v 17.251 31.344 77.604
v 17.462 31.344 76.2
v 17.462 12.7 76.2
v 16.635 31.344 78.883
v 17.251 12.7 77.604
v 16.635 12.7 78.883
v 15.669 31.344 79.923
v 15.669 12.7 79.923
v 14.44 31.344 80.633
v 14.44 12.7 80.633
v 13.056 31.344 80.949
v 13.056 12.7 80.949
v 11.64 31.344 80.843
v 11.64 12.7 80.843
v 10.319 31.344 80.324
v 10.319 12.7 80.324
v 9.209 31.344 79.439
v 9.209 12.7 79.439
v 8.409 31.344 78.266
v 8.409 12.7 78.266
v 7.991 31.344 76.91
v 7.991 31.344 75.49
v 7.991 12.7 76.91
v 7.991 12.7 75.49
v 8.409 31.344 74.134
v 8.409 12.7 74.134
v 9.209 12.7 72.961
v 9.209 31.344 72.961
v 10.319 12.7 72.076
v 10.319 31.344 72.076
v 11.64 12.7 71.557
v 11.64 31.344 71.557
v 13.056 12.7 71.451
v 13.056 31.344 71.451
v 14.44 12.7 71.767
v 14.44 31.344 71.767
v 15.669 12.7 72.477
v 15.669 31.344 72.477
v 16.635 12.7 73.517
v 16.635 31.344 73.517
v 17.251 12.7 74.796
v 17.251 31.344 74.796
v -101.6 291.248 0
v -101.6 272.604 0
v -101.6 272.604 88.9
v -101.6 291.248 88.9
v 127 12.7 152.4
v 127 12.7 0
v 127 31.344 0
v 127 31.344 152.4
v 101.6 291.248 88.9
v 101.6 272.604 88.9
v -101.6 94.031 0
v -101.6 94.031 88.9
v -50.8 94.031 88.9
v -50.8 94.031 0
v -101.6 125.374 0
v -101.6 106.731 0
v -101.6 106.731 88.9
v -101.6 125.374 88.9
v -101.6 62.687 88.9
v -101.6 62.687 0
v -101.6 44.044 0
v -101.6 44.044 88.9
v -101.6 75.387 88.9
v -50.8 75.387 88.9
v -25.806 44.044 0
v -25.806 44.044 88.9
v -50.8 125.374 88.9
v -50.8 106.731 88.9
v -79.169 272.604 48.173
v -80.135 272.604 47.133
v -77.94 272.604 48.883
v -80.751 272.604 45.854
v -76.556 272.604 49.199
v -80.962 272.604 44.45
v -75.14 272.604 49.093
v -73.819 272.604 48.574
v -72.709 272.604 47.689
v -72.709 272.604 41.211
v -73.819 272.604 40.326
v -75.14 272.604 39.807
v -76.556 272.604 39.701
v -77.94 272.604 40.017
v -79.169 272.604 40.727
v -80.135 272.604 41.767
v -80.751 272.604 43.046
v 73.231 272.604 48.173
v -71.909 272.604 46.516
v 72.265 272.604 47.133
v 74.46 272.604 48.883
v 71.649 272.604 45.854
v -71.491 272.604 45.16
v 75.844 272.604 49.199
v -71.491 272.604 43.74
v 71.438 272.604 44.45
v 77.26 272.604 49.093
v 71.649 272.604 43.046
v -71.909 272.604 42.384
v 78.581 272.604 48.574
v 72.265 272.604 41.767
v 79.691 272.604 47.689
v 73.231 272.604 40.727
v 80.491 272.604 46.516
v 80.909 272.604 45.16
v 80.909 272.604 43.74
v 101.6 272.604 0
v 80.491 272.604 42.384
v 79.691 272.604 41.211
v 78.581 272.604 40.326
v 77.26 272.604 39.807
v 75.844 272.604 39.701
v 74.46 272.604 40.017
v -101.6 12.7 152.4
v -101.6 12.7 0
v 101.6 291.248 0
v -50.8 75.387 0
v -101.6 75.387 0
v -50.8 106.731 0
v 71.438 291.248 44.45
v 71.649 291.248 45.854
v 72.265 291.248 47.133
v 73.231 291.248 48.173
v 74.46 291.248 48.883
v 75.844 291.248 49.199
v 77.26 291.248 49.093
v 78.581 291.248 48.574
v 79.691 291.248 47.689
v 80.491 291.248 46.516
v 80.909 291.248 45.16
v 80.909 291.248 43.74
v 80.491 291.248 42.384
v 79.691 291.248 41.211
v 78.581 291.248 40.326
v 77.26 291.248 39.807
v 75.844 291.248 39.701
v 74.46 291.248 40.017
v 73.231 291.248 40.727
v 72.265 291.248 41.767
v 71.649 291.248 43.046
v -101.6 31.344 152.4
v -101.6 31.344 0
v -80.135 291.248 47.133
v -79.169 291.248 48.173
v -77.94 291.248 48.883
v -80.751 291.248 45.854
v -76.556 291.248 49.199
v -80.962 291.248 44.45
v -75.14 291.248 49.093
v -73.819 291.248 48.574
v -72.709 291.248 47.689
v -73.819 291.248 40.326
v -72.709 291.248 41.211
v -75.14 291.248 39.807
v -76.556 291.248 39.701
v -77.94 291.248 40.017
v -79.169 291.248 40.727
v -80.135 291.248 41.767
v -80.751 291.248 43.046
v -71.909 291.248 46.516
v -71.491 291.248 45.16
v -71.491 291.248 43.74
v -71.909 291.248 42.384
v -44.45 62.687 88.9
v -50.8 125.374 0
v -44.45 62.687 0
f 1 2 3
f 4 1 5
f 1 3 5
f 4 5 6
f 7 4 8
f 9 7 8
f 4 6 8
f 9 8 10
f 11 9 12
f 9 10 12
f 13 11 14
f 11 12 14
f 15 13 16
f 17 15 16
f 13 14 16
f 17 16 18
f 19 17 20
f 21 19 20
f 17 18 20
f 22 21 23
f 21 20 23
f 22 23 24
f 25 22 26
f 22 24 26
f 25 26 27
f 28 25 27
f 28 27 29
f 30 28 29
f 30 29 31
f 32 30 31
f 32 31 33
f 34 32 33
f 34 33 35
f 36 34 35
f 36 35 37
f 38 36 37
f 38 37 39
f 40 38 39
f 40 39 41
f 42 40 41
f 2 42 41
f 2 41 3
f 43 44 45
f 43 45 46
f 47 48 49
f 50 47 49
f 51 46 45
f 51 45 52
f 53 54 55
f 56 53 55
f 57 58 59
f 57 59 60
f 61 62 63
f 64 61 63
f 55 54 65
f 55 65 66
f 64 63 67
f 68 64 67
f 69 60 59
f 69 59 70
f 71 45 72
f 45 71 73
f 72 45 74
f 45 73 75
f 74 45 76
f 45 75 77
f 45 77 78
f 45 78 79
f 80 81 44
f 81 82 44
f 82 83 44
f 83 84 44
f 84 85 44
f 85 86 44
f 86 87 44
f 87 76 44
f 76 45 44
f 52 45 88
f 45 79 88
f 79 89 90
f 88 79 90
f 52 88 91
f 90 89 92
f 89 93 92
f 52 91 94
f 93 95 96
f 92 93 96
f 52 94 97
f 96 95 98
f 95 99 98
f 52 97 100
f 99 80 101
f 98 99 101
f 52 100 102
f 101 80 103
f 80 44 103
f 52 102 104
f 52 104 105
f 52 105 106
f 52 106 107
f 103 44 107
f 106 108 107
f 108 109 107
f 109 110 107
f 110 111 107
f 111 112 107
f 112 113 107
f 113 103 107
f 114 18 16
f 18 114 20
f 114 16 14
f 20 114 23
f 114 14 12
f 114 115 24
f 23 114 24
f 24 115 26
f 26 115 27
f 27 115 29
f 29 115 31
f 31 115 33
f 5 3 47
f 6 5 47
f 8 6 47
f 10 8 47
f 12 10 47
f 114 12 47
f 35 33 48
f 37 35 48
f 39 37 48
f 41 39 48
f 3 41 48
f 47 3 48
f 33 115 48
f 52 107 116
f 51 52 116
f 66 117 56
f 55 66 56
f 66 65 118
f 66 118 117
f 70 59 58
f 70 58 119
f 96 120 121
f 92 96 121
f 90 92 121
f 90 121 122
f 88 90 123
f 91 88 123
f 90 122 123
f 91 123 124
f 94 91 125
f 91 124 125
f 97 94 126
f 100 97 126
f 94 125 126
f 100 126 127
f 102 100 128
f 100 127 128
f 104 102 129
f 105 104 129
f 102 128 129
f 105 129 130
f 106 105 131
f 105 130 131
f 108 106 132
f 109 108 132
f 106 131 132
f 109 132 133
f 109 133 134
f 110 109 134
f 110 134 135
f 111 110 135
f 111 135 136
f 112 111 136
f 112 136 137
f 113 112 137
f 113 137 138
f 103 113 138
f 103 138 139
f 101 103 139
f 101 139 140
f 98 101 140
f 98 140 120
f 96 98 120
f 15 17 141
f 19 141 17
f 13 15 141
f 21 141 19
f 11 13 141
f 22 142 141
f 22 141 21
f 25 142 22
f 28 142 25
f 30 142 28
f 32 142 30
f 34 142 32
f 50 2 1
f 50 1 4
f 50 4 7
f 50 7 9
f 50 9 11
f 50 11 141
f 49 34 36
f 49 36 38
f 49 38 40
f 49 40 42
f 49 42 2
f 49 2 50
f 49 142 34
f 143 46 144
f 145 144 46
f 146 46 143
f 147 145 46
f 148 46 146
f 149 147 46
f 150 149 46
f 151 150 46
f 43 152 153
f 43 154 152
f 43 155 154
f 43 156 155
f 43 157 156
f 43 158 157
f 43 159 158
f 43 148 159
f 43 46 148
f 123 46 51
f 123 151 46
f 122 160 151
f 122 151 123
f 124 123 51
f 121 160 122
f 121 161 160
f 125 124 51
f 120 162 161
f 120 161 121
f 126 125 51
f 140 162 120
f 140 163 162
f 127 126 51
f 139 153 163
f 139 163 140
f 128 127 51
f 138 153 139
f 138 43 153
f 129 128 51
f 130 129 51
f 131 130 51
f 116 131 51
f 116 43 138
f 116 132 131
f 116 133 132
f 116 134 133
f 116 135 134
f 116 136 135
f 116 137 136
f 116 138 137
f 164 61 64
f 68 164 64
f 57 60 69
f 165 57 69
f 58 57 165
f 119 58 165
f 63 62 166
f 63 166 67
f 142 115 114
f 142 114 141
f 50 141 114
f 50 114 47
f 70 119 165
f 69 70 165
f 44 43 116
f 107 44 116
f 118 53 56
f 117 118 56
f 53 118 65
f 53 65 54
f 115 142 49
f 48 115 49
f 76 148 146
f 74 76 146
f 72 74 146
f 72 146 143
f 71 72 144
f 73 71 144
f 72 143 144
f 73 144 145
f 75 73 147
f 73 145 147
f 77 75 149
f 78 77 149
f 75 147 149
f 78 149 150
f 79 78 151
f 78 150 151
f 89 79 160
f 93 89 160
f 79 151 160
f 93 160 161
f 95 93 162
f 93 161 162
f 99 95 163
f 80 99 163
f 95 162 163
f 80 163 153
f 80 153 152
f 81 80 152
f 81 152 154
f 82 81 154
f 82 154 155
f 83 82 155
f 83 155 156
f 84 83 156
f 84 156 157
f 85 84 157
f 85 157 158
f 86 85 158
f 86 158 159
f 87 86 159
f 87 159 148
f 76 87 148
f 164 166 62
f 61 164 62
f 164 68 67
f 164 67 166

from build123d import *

# Parameters (mm, degrees)
F0_W     = 228.6
F0_H     = 18.6436
F4_DEPTH = 152.4
F1_R     = 4.7625
F2_DEPTH = 25.4
F3_DEPTH = 88.9
F0_W_2   = 50.8
F0_W_3   = 203.2
F5_R     = 4.7625
F6_DEPTH = 278.54900588


with BuildPart() as f4:
    # F0 (on Top) → F4 (new body)
    with BuildSketch(Plane.XY):
        with Locations((12.7, 22.0218)):
            Rectangle(F0_W, F0_H)
    extrude(amount=F4_DEPTH)

    # F1 (on face) → F2 (cut)
    with BuildSketch(Plane.XZ.offset(-12.7)):
        with Locations((12.7, 76.2)):
            Circle(F1_R)
    extrude(amount=-F2_DEPTH, mode=Mode.SUBTRACT)


with BuildPart() as f3:
    # F0 (on Top) → F3 (new body)
    with BuildSketch(Plane.XY):
        Polygon((-44.45, 62.6872), (-101.6, 62.6872), (-101.6, 44.0436), (-25.8064, 44.0436), align=None)
    extrude(amount=F3_DEPTH)


with BuildPart() as f3b:
    # F0 (on Top) → F3, piece 2 (new body)
    with BuildSketch(Plane.XY):
        with Locations((-76.2, 84.709)):
            Rectangle(F0_W_2, F0_H)
    extrude(amount=F3_DEPTH)


with BuildPart() as f3c:
    # F0 (on Top) → F3, piece 3 (new body)
    with BuildSketch(Plane.XY):
        with Locations((-76.2, 116.0526)):
            Rectangle(F0_W_2, F0_H)
    extrude(amount=F3_DEPTH)


with BuildPart() as f3d:
    # F0 (on Top) → F3, piece 4 (new body)
    with BuildSketch(Plane.XY):
        with Locations((0, 281.92620588)):
            Rectangle(F0_W_3, F0_H)
    extrude(amount=F3_DEPTH)

    # F5 (on face) → F6 (cut, through all)
    with BuildSketch(Plane(origin=(0, 291.24800588, 0), x_dir=(-1, 0, 0), z_dir=(0, 1, 0))):
        with Locations((76.2, 44.45)):
            Circle(F5_R)
        with Locations((-76.2, 44.45)):
            Circle(F5_R)
    extrude(amount=-F6_DEPTH, mode=Mode.SUBTRACT)


solid = Compound([f4.part, f3.part, f3b.part, f3c.part, f3d.part])
